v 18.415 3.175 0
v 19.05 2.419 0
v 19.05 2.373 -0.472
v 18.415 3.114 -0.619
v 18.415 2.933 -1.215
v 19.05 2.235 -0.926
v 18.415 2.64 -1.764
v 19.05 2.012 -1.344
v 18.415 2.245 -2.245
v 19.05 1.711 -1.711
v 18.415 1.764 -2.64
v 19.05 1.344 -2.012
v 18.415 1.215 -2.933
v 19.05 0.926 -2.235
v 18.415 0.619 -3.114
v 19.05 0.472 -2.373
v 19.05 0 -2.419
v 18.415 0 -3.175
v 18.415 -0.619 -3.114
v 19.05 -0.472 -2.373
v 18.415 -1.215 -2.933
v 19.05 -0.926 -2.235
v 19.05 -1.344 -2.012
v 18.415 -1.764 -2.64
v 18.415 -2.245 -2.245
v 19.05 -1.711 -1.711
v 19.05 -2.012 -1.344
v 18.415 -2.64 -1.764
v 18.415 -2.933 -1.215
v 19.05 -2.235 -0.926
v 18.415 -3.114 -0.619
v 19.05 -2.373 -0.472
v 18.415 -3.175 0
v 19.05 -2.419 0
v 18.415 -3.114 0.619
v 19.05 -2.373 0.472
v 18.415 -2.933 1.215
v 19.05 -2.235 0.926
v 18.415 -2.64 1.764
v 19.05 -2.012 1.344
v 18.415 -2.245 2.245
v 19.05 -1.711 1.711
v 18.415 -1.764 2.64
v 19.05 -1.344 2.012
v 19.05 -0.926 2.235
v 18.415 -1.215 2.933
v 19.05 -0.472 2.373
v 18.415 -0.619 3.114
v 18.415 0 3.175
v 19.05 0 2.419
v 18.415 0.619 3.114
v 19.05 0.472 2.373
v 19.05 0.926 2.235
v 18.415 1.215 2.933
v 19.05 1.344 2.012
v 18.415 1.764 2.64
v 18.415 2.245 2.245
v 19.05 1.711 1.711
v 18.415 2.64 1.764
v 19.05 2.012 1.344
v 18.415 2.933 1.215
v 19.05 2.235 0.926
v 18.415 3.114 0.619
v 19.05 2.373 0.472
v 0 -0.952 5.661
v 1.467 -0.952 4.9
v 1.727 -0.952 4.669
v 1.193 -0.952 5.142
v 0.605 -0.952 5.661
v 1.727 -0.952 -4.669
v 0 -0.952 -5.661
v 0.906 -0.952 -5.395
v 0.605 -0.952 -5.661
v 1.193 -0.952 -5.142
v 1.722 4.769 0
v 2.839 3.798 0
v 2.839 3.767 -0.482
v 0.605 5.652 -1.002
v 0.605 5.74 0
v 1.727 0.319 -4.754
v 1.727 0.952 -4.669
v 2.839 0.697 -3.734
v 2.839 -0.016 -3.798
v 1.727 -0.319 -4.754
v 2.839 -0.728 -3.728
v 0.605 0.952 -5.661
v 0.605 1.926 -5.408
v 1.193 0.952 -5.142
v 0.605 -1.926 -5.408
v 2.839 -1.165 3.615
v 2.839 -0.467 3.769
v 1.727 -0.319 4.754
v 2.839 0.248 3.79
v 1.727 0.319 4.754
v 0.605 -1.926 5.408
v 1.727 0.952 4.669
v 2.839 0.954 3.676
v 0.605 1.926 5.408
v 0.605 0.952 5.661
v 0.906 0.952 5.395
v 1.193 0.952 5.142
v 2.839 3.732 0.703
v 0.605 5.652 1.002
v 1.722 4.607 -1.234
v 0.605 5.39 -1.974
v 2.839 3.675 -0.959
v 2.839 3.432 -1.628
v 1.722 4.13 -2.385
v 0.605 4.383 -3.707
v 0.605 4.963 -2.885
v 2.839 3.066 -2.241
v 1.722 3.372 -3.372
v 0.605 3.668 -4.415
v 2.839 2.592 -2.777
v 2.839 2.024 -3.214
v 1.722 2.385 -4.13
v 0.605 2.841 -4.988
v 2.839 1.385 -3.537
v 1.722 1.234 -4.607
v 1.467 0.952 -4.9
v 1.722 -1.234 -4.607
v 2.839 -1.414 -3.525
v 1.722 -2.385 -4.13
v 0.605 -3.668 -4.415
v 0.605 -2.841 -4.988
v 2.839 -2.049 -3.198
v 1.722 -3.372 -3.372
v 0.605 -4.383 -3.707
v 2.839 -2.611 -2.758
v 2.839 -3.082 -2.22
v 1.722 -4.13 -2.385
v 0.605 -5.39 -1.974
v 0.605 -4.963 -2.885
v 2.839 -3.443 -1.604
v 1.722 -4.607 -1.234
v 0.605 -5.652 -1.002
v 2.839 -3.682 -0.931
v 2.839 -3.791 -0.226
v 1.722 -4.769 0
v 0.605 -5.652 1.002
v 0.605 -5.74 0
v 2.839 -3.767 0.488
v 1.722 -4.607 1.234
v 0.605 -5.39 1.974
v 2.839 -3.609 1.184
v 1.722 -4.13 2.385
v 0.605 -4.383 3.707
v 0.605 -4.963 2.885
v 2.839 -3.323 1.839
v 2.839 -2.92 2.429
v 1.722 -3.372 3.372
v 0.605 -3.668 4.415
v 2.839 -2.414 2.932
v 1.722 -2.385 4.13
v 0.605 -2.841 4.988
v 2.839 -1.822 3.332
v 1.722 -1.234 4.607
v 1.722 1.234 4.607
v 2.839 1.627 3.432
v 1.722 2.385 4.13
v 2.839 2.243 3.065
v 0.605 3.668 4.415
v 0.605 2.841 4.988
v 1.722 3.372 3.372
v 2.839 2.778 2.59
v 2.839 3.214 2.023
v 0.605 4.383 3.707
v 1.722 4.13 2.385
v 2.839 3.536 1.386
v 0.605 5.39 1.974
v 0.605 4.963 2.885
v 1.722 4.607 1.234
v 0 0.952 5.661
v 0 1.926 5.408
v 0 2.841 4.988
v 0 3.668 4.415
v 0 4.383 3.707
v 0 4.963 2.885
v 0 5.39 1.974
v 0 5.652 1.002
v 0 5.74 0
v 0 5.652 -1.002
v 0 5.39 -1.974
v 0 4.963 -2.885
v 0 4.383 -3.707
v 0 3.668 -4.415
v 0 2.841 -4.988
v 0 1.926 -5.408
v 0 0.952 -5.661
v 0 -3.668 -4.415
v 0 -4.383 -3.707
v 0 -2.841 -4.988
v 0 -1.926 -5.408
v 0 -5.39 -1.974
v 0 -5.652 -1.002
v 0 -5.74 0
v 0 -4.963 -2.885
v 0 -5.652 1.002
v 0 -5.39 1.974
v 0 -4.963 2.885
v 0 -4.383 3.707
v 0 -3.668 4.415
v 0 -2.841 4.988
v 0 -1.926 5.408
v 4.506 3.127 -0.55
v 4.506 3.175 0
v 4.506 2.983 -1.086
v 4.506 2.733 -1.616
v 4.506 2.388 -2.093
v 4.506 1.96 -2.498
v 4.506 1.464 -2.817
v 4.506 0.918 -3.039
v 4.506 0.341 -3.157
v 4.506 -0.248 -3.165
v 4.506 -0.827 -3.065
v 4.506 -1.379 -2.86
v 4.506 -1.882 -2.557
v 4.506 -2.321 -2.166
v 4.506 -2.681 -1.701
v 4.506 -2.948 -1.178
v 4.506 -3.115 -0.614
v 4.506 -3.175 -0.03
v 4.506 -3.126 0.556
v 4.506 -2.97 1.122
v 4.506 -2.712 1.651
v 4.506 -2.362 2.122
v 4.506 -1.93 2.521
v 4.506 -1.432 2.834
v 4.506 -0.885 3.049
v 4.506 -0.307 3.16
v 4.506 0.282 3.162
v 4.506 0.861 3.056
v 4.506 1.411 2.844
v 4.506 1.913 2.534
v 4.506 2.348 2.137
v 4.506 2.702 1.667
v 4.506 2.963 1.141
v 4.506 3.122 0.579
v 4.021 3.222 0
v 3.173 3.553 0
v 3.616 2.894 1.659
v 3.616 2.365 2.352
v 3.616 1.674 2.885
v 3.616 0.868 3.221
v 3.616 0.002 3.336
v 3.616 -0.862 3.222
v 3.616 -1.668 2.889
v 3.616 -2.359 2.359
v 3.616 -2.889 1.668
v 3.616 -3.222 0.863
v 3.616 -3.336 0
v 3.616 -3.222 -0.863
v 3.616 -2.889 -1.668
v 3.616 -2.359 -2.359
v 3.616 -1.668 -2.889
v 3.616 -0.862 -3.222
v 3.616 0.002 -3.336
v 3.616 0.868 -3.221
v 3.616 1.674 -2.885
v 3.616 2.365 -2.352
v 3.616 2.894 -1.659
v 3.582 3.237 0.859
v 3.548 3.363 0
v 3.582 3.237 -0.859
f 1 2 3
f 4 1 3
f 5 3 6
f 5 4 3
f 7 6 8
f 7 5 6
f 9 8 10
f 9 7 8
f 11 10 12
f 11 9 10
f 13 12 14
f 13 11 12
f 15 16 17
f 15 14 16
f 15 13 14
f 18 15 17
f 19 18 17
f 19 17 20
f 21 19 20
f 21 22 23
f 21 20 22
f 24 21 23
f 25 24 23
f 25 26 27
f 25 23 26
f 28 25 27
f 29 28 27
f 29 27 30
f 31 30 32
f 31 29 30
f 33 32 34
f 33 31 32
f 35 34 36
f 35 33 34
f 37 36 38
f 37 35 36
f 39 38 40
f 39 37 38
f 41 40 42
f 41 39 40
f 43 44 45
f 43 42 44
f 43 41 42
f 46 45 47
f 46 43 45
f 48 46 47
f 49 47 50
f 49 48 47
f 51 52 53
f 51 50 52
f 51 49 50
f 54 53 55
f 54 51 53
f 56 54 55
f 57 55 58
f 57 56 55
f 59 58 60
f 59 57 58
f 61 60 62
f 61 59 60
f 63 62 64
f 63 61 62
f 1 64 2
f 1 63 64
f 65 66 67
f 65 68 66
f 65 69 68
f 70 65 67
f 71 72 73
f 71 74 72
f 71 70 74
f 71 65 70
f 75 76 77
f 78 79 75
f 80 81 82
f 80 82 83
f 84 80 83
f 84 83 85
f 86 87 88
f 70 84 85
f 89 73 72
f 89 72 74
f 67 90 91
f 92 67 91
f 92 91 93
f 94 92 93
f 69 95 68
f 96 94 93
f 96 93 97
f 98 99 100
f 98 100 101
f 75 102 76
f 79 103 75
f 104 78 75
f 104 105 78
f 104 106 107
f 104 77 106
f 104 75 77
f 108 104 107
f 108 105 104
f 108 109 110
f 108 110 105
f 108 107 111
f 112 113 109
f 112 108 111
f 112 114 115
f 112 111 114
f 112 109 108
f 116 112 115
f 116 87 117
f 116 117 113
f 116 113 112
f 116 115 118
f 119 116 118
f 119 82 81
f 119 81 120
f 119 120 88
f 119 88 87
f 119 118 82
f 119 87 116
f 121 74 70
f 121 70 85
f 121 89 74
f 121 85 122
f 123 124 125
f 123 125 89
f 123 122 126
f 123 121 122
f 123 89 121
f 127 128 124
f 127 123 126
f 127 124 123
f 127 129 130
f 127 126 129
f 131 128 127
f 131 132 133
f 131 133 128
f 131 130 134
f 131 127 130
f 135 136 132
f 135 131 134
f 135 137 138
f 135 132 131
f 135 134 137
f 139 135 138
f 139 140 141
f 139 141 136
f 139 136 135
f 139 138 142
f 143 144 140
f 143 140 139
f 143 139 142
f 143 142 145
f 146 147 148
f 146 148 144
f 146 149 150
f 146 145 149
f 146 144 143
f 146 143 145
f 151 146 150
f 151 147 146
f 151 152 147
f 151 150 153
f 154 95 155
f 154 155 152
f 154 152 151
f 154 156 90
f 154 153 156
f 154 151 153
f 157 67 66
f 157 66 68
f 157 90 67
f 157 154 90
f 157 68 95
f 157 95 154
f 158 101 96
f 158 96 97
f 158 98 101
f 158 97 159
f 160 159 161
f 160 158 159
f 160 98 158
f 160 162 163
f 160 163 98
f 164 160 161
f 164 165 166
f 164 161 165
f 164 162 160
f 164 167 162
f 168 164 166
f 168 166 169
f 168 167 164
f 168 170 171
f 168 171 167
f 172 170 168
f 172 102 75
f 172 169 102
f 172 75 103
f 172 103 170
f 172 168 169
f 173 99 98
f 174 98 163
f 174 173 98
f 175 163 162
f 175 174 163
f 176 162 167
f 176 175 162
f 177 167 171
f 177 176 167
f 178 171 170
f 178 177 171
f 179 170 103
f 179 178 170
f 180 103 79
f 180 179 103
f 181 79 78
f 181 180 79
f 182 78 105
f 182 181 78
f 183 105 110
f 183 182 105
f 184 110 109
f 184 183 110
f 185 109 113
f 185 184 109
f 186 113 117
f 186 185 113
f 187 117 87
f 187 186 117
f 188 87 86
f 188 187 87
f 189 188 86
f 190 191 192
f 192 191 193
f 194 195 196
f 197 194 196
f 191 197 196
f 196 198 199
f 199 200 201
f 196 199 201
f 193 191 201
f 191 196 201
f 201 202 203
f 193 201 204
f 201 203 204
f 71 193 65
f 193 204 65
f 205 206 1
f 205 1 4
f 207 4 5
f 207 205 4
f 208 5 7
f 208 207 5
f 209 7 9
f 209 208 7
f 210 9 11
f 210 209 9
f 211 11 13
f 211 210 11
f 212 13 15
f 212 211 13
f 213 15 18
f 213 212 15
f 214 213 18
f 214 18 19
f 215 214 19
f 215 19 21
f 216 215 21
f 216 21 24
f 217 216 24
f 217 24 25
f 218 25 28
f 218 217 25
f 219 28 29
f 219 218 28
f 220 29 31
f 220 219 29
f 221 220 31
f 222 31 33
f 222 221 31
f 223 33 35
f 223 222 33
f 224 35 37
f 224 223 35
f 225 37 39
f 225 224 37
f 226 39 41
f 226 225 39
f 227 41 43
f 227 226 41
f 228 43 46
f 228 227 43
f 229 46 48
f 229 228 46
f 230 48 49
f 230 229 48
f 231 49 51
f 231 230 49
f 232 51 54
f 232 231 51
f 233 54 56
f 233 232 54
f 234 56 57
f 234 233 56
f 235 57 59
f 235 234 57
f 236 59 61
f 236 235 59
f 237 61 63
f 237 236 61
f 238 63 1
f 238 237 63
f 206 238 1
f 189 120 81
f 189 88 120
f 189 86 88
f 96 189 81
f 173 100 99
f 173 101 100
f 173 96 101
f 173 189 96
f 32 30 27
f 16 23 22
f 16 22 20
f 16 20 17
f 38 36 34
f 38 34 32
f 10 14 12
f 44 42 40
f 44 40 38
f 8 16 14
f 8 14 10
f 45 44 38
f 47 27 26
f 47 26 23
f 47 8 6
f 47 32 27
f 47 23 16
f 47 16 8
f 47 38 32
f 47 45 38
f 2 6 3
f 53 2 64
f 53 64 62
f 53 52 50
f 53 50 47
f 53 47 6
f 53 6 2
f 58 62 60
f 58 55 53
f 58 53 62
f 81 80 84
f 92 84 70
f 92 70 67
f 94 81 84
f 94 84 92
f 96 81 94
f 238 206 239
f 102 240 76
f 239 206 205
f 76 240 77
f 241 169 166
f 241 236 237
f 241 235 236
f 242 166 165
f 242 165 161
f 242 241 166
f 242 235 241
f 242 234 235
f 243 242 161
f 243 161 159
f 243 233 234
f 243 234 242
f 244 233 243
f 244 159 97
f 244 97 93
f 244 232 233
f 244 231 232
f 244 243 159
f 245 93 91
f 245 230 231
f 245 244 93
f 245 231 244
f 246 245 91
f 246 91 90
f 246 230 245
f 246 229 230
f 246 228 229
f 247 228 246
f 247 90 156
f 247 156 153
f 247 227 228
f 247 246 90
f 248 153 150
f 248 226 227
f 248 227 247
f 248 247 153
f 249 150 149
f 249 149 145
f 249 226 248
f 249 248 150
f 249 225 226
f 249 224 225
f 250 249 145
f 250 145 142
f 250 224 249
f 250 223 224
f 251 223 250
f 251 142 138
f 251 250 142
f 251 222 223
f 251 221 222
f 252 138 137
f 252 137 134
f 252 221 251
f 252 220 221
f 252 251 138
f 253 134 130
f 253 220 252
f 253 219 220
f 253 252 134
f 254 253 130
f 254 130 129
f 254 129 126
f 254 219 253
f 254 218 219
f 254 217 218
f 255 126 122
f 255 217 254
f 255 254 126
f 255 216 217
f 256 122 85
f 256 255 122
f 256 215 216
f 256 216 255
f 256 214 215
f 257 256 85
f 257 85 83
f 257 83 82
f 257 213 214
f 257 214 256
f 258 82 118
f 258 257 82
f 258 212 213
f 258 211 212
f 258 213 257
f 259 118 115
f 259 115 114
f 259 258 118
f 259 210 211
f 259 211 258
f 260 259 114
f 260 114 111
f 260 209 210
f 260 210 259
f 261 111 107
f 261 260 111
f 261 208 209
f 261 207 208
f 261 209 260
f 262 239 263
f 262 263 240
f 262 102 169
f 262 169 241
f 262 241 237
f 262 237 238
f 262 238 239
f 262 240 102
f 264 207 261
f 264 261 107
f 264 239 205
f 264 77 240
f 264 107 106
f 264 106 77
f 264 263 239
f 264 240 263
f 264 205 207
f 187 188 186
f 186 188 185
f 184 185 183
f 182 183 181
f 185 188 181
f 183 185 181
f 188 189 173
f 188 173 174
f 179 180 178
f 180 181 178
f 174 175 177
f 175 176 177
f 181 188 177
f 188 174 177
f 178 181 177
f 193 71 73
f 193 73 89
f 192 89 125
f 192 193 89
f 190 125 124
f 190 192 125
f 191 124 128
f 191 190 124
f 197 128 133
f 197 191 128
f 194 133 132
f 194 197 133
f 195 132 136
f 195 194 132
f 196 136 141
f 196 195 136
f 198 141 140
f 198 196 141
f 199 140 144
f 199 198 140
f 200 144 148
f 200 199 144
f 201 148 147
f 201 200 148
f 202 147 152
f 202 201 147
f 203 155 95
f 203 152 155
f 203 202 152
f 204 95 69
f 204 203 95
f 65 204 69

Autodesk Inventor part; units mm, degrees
ref_plane "YZ Plane" through (0, 0, 0) normal (1, 0, 0) x (0, 1, 0)
ref_plane "XZ Plane" through (0, 0, 0) normal (0, 1, 0) x (-1, 0, 0)
sketch "Sketch1" plane through (0, 0, 0) normal (0, 0, 1) x (1, 0, 0)
  line L0 (0, 0) -> (19.05, 0)
  line L1 (19.05, 0) -> (19.05, 3.175)
  line L2 (19.05, 3.175) -> (6.731, 3.175)
  line L3 (6.731, 3.175) -> (5.461, 3.175)
  line L4 (5.461, 3.175) -> (3.556, 3.175)
  line L5 (3.556, 3.175) -> (0.6048, 5.7404)
  line L6 (0.6048, 5.7404) -> (0, 5.7404)
  line L7 (0, 5.7404) -> (0, 0)
  line L8 (6.731, 3.175) -> (3.556, 3.175) construction
  line L9 (-3.81, 0) -> (22.86, 0) projected
  line L10 (0, 6.8885) -> (0, -1.1481) projected
  dimension "d0" = 19.05
  dimension "d1" = 41
  dimension "d2" = 1.27
  dimension "d3" = 12.319
  dimension "d4" = 3.556
  dimension "d5" = 6.35
  dimension "d6" = 6.35
  dimension "d7" = 11.4808
revolve "Body" add sketch "Sketch1" angle 360 about axis through (0, 0, 0) along (1, 0, 0)
sketch "Sketch2" plane through (0, 0, 0) normal (-1, 0, 0) x (0, 0, 1)
  line L0 (5.7404, -0.9525) -> (-5.7404, -0.9525)
  line L1 (-5.7404, -0.9525) -> (-5.7404, 0.9525)
  line L2 (-5.7404, 0.9525) -> (5.7404, 0.9525)
  line L3 (5.7404, 0.9525) -> (5.7404, -0.9525)
  line L4 (0, 0.9525) -> (0, -0.9525) construction
  line L5 (-5.7404, 0) -> (5.7404, 0) construction
  line L6 (0, 5.7404) -> (0, 0) projected
  dimension "d15" = 1.905
  dimension "d16" = 11.4808
extrude "Slot" cut sketch "Sketch2" against normal blind 1.7272
thread "Thread" size "1/4-20 UNC" class "2A" standard "ANSI Unified Screw Threads" length 12.319
chamfer "Chamfer1" distance 0.7556 distance2 0.635 1 edges at (19.05, -3.175, 0) measured on face at (19.05, 0.3445, 0.7363)
fillet "Radius" radius 2.54 1 edges at (3.556, -3.175, 0)
ref_plane "Work Plane1" through (33.575, 0, 0) normal (0, 0, -1) x (1, 0, 0)
equation "\"d0\" = NLG"
equation "\"d1\" = 0.5 * SEWI"
equation "\"d2\" = GAL"
equation "\"d3\" = GEL"
equation "\"d4\" = KOH"
equation "\"d5\" = BDM"
equation "\"d6\" = GD"
equation "\"d7\" = KOD"
equation "\"d15\" = SBR"
equation "\"d16\" = KOD"
equation "\"d8\" = STI"
equation "\"d41\" = RR"
equation "\"d10\" = GEL"
equation "\"d12\" = -0.5 * SPD + 0.5 * GD"
equation "\"d13\" = 0.5 * GAL"
equation "\"NLG\" = 19.05"
equation "\"GAL\" = 1.27"
equation "\"GEL\" = 12.319"
equation "\"KOH\" = 3.556"
equation "\"KOD\" = 11.4808"
equation "\"SEWI\" = 82deg"
equation "\"BDM\" = NND"
equation "\"GD\" = NND"
equation "\"SBR\" = 1.905"
equation "\"STI\" = 1.7272"
equation "\"SPD\" = 4.8387"
equation "\"RR\" = 2.54"
equation "\"GUL\" = 0.75565"
equation "\"TOA\" = 30deg"
equation "\"THREADDIA\" = 6.35"
equation "\"HHPTC\" = 1.27"
equation "\"NND\" = 6.35"
equation "\"GD1\" = SPD"
properties part number "ANSI B18.6.2 - 1/4-20 UNC x 0.75" material "Steel, Mild"
